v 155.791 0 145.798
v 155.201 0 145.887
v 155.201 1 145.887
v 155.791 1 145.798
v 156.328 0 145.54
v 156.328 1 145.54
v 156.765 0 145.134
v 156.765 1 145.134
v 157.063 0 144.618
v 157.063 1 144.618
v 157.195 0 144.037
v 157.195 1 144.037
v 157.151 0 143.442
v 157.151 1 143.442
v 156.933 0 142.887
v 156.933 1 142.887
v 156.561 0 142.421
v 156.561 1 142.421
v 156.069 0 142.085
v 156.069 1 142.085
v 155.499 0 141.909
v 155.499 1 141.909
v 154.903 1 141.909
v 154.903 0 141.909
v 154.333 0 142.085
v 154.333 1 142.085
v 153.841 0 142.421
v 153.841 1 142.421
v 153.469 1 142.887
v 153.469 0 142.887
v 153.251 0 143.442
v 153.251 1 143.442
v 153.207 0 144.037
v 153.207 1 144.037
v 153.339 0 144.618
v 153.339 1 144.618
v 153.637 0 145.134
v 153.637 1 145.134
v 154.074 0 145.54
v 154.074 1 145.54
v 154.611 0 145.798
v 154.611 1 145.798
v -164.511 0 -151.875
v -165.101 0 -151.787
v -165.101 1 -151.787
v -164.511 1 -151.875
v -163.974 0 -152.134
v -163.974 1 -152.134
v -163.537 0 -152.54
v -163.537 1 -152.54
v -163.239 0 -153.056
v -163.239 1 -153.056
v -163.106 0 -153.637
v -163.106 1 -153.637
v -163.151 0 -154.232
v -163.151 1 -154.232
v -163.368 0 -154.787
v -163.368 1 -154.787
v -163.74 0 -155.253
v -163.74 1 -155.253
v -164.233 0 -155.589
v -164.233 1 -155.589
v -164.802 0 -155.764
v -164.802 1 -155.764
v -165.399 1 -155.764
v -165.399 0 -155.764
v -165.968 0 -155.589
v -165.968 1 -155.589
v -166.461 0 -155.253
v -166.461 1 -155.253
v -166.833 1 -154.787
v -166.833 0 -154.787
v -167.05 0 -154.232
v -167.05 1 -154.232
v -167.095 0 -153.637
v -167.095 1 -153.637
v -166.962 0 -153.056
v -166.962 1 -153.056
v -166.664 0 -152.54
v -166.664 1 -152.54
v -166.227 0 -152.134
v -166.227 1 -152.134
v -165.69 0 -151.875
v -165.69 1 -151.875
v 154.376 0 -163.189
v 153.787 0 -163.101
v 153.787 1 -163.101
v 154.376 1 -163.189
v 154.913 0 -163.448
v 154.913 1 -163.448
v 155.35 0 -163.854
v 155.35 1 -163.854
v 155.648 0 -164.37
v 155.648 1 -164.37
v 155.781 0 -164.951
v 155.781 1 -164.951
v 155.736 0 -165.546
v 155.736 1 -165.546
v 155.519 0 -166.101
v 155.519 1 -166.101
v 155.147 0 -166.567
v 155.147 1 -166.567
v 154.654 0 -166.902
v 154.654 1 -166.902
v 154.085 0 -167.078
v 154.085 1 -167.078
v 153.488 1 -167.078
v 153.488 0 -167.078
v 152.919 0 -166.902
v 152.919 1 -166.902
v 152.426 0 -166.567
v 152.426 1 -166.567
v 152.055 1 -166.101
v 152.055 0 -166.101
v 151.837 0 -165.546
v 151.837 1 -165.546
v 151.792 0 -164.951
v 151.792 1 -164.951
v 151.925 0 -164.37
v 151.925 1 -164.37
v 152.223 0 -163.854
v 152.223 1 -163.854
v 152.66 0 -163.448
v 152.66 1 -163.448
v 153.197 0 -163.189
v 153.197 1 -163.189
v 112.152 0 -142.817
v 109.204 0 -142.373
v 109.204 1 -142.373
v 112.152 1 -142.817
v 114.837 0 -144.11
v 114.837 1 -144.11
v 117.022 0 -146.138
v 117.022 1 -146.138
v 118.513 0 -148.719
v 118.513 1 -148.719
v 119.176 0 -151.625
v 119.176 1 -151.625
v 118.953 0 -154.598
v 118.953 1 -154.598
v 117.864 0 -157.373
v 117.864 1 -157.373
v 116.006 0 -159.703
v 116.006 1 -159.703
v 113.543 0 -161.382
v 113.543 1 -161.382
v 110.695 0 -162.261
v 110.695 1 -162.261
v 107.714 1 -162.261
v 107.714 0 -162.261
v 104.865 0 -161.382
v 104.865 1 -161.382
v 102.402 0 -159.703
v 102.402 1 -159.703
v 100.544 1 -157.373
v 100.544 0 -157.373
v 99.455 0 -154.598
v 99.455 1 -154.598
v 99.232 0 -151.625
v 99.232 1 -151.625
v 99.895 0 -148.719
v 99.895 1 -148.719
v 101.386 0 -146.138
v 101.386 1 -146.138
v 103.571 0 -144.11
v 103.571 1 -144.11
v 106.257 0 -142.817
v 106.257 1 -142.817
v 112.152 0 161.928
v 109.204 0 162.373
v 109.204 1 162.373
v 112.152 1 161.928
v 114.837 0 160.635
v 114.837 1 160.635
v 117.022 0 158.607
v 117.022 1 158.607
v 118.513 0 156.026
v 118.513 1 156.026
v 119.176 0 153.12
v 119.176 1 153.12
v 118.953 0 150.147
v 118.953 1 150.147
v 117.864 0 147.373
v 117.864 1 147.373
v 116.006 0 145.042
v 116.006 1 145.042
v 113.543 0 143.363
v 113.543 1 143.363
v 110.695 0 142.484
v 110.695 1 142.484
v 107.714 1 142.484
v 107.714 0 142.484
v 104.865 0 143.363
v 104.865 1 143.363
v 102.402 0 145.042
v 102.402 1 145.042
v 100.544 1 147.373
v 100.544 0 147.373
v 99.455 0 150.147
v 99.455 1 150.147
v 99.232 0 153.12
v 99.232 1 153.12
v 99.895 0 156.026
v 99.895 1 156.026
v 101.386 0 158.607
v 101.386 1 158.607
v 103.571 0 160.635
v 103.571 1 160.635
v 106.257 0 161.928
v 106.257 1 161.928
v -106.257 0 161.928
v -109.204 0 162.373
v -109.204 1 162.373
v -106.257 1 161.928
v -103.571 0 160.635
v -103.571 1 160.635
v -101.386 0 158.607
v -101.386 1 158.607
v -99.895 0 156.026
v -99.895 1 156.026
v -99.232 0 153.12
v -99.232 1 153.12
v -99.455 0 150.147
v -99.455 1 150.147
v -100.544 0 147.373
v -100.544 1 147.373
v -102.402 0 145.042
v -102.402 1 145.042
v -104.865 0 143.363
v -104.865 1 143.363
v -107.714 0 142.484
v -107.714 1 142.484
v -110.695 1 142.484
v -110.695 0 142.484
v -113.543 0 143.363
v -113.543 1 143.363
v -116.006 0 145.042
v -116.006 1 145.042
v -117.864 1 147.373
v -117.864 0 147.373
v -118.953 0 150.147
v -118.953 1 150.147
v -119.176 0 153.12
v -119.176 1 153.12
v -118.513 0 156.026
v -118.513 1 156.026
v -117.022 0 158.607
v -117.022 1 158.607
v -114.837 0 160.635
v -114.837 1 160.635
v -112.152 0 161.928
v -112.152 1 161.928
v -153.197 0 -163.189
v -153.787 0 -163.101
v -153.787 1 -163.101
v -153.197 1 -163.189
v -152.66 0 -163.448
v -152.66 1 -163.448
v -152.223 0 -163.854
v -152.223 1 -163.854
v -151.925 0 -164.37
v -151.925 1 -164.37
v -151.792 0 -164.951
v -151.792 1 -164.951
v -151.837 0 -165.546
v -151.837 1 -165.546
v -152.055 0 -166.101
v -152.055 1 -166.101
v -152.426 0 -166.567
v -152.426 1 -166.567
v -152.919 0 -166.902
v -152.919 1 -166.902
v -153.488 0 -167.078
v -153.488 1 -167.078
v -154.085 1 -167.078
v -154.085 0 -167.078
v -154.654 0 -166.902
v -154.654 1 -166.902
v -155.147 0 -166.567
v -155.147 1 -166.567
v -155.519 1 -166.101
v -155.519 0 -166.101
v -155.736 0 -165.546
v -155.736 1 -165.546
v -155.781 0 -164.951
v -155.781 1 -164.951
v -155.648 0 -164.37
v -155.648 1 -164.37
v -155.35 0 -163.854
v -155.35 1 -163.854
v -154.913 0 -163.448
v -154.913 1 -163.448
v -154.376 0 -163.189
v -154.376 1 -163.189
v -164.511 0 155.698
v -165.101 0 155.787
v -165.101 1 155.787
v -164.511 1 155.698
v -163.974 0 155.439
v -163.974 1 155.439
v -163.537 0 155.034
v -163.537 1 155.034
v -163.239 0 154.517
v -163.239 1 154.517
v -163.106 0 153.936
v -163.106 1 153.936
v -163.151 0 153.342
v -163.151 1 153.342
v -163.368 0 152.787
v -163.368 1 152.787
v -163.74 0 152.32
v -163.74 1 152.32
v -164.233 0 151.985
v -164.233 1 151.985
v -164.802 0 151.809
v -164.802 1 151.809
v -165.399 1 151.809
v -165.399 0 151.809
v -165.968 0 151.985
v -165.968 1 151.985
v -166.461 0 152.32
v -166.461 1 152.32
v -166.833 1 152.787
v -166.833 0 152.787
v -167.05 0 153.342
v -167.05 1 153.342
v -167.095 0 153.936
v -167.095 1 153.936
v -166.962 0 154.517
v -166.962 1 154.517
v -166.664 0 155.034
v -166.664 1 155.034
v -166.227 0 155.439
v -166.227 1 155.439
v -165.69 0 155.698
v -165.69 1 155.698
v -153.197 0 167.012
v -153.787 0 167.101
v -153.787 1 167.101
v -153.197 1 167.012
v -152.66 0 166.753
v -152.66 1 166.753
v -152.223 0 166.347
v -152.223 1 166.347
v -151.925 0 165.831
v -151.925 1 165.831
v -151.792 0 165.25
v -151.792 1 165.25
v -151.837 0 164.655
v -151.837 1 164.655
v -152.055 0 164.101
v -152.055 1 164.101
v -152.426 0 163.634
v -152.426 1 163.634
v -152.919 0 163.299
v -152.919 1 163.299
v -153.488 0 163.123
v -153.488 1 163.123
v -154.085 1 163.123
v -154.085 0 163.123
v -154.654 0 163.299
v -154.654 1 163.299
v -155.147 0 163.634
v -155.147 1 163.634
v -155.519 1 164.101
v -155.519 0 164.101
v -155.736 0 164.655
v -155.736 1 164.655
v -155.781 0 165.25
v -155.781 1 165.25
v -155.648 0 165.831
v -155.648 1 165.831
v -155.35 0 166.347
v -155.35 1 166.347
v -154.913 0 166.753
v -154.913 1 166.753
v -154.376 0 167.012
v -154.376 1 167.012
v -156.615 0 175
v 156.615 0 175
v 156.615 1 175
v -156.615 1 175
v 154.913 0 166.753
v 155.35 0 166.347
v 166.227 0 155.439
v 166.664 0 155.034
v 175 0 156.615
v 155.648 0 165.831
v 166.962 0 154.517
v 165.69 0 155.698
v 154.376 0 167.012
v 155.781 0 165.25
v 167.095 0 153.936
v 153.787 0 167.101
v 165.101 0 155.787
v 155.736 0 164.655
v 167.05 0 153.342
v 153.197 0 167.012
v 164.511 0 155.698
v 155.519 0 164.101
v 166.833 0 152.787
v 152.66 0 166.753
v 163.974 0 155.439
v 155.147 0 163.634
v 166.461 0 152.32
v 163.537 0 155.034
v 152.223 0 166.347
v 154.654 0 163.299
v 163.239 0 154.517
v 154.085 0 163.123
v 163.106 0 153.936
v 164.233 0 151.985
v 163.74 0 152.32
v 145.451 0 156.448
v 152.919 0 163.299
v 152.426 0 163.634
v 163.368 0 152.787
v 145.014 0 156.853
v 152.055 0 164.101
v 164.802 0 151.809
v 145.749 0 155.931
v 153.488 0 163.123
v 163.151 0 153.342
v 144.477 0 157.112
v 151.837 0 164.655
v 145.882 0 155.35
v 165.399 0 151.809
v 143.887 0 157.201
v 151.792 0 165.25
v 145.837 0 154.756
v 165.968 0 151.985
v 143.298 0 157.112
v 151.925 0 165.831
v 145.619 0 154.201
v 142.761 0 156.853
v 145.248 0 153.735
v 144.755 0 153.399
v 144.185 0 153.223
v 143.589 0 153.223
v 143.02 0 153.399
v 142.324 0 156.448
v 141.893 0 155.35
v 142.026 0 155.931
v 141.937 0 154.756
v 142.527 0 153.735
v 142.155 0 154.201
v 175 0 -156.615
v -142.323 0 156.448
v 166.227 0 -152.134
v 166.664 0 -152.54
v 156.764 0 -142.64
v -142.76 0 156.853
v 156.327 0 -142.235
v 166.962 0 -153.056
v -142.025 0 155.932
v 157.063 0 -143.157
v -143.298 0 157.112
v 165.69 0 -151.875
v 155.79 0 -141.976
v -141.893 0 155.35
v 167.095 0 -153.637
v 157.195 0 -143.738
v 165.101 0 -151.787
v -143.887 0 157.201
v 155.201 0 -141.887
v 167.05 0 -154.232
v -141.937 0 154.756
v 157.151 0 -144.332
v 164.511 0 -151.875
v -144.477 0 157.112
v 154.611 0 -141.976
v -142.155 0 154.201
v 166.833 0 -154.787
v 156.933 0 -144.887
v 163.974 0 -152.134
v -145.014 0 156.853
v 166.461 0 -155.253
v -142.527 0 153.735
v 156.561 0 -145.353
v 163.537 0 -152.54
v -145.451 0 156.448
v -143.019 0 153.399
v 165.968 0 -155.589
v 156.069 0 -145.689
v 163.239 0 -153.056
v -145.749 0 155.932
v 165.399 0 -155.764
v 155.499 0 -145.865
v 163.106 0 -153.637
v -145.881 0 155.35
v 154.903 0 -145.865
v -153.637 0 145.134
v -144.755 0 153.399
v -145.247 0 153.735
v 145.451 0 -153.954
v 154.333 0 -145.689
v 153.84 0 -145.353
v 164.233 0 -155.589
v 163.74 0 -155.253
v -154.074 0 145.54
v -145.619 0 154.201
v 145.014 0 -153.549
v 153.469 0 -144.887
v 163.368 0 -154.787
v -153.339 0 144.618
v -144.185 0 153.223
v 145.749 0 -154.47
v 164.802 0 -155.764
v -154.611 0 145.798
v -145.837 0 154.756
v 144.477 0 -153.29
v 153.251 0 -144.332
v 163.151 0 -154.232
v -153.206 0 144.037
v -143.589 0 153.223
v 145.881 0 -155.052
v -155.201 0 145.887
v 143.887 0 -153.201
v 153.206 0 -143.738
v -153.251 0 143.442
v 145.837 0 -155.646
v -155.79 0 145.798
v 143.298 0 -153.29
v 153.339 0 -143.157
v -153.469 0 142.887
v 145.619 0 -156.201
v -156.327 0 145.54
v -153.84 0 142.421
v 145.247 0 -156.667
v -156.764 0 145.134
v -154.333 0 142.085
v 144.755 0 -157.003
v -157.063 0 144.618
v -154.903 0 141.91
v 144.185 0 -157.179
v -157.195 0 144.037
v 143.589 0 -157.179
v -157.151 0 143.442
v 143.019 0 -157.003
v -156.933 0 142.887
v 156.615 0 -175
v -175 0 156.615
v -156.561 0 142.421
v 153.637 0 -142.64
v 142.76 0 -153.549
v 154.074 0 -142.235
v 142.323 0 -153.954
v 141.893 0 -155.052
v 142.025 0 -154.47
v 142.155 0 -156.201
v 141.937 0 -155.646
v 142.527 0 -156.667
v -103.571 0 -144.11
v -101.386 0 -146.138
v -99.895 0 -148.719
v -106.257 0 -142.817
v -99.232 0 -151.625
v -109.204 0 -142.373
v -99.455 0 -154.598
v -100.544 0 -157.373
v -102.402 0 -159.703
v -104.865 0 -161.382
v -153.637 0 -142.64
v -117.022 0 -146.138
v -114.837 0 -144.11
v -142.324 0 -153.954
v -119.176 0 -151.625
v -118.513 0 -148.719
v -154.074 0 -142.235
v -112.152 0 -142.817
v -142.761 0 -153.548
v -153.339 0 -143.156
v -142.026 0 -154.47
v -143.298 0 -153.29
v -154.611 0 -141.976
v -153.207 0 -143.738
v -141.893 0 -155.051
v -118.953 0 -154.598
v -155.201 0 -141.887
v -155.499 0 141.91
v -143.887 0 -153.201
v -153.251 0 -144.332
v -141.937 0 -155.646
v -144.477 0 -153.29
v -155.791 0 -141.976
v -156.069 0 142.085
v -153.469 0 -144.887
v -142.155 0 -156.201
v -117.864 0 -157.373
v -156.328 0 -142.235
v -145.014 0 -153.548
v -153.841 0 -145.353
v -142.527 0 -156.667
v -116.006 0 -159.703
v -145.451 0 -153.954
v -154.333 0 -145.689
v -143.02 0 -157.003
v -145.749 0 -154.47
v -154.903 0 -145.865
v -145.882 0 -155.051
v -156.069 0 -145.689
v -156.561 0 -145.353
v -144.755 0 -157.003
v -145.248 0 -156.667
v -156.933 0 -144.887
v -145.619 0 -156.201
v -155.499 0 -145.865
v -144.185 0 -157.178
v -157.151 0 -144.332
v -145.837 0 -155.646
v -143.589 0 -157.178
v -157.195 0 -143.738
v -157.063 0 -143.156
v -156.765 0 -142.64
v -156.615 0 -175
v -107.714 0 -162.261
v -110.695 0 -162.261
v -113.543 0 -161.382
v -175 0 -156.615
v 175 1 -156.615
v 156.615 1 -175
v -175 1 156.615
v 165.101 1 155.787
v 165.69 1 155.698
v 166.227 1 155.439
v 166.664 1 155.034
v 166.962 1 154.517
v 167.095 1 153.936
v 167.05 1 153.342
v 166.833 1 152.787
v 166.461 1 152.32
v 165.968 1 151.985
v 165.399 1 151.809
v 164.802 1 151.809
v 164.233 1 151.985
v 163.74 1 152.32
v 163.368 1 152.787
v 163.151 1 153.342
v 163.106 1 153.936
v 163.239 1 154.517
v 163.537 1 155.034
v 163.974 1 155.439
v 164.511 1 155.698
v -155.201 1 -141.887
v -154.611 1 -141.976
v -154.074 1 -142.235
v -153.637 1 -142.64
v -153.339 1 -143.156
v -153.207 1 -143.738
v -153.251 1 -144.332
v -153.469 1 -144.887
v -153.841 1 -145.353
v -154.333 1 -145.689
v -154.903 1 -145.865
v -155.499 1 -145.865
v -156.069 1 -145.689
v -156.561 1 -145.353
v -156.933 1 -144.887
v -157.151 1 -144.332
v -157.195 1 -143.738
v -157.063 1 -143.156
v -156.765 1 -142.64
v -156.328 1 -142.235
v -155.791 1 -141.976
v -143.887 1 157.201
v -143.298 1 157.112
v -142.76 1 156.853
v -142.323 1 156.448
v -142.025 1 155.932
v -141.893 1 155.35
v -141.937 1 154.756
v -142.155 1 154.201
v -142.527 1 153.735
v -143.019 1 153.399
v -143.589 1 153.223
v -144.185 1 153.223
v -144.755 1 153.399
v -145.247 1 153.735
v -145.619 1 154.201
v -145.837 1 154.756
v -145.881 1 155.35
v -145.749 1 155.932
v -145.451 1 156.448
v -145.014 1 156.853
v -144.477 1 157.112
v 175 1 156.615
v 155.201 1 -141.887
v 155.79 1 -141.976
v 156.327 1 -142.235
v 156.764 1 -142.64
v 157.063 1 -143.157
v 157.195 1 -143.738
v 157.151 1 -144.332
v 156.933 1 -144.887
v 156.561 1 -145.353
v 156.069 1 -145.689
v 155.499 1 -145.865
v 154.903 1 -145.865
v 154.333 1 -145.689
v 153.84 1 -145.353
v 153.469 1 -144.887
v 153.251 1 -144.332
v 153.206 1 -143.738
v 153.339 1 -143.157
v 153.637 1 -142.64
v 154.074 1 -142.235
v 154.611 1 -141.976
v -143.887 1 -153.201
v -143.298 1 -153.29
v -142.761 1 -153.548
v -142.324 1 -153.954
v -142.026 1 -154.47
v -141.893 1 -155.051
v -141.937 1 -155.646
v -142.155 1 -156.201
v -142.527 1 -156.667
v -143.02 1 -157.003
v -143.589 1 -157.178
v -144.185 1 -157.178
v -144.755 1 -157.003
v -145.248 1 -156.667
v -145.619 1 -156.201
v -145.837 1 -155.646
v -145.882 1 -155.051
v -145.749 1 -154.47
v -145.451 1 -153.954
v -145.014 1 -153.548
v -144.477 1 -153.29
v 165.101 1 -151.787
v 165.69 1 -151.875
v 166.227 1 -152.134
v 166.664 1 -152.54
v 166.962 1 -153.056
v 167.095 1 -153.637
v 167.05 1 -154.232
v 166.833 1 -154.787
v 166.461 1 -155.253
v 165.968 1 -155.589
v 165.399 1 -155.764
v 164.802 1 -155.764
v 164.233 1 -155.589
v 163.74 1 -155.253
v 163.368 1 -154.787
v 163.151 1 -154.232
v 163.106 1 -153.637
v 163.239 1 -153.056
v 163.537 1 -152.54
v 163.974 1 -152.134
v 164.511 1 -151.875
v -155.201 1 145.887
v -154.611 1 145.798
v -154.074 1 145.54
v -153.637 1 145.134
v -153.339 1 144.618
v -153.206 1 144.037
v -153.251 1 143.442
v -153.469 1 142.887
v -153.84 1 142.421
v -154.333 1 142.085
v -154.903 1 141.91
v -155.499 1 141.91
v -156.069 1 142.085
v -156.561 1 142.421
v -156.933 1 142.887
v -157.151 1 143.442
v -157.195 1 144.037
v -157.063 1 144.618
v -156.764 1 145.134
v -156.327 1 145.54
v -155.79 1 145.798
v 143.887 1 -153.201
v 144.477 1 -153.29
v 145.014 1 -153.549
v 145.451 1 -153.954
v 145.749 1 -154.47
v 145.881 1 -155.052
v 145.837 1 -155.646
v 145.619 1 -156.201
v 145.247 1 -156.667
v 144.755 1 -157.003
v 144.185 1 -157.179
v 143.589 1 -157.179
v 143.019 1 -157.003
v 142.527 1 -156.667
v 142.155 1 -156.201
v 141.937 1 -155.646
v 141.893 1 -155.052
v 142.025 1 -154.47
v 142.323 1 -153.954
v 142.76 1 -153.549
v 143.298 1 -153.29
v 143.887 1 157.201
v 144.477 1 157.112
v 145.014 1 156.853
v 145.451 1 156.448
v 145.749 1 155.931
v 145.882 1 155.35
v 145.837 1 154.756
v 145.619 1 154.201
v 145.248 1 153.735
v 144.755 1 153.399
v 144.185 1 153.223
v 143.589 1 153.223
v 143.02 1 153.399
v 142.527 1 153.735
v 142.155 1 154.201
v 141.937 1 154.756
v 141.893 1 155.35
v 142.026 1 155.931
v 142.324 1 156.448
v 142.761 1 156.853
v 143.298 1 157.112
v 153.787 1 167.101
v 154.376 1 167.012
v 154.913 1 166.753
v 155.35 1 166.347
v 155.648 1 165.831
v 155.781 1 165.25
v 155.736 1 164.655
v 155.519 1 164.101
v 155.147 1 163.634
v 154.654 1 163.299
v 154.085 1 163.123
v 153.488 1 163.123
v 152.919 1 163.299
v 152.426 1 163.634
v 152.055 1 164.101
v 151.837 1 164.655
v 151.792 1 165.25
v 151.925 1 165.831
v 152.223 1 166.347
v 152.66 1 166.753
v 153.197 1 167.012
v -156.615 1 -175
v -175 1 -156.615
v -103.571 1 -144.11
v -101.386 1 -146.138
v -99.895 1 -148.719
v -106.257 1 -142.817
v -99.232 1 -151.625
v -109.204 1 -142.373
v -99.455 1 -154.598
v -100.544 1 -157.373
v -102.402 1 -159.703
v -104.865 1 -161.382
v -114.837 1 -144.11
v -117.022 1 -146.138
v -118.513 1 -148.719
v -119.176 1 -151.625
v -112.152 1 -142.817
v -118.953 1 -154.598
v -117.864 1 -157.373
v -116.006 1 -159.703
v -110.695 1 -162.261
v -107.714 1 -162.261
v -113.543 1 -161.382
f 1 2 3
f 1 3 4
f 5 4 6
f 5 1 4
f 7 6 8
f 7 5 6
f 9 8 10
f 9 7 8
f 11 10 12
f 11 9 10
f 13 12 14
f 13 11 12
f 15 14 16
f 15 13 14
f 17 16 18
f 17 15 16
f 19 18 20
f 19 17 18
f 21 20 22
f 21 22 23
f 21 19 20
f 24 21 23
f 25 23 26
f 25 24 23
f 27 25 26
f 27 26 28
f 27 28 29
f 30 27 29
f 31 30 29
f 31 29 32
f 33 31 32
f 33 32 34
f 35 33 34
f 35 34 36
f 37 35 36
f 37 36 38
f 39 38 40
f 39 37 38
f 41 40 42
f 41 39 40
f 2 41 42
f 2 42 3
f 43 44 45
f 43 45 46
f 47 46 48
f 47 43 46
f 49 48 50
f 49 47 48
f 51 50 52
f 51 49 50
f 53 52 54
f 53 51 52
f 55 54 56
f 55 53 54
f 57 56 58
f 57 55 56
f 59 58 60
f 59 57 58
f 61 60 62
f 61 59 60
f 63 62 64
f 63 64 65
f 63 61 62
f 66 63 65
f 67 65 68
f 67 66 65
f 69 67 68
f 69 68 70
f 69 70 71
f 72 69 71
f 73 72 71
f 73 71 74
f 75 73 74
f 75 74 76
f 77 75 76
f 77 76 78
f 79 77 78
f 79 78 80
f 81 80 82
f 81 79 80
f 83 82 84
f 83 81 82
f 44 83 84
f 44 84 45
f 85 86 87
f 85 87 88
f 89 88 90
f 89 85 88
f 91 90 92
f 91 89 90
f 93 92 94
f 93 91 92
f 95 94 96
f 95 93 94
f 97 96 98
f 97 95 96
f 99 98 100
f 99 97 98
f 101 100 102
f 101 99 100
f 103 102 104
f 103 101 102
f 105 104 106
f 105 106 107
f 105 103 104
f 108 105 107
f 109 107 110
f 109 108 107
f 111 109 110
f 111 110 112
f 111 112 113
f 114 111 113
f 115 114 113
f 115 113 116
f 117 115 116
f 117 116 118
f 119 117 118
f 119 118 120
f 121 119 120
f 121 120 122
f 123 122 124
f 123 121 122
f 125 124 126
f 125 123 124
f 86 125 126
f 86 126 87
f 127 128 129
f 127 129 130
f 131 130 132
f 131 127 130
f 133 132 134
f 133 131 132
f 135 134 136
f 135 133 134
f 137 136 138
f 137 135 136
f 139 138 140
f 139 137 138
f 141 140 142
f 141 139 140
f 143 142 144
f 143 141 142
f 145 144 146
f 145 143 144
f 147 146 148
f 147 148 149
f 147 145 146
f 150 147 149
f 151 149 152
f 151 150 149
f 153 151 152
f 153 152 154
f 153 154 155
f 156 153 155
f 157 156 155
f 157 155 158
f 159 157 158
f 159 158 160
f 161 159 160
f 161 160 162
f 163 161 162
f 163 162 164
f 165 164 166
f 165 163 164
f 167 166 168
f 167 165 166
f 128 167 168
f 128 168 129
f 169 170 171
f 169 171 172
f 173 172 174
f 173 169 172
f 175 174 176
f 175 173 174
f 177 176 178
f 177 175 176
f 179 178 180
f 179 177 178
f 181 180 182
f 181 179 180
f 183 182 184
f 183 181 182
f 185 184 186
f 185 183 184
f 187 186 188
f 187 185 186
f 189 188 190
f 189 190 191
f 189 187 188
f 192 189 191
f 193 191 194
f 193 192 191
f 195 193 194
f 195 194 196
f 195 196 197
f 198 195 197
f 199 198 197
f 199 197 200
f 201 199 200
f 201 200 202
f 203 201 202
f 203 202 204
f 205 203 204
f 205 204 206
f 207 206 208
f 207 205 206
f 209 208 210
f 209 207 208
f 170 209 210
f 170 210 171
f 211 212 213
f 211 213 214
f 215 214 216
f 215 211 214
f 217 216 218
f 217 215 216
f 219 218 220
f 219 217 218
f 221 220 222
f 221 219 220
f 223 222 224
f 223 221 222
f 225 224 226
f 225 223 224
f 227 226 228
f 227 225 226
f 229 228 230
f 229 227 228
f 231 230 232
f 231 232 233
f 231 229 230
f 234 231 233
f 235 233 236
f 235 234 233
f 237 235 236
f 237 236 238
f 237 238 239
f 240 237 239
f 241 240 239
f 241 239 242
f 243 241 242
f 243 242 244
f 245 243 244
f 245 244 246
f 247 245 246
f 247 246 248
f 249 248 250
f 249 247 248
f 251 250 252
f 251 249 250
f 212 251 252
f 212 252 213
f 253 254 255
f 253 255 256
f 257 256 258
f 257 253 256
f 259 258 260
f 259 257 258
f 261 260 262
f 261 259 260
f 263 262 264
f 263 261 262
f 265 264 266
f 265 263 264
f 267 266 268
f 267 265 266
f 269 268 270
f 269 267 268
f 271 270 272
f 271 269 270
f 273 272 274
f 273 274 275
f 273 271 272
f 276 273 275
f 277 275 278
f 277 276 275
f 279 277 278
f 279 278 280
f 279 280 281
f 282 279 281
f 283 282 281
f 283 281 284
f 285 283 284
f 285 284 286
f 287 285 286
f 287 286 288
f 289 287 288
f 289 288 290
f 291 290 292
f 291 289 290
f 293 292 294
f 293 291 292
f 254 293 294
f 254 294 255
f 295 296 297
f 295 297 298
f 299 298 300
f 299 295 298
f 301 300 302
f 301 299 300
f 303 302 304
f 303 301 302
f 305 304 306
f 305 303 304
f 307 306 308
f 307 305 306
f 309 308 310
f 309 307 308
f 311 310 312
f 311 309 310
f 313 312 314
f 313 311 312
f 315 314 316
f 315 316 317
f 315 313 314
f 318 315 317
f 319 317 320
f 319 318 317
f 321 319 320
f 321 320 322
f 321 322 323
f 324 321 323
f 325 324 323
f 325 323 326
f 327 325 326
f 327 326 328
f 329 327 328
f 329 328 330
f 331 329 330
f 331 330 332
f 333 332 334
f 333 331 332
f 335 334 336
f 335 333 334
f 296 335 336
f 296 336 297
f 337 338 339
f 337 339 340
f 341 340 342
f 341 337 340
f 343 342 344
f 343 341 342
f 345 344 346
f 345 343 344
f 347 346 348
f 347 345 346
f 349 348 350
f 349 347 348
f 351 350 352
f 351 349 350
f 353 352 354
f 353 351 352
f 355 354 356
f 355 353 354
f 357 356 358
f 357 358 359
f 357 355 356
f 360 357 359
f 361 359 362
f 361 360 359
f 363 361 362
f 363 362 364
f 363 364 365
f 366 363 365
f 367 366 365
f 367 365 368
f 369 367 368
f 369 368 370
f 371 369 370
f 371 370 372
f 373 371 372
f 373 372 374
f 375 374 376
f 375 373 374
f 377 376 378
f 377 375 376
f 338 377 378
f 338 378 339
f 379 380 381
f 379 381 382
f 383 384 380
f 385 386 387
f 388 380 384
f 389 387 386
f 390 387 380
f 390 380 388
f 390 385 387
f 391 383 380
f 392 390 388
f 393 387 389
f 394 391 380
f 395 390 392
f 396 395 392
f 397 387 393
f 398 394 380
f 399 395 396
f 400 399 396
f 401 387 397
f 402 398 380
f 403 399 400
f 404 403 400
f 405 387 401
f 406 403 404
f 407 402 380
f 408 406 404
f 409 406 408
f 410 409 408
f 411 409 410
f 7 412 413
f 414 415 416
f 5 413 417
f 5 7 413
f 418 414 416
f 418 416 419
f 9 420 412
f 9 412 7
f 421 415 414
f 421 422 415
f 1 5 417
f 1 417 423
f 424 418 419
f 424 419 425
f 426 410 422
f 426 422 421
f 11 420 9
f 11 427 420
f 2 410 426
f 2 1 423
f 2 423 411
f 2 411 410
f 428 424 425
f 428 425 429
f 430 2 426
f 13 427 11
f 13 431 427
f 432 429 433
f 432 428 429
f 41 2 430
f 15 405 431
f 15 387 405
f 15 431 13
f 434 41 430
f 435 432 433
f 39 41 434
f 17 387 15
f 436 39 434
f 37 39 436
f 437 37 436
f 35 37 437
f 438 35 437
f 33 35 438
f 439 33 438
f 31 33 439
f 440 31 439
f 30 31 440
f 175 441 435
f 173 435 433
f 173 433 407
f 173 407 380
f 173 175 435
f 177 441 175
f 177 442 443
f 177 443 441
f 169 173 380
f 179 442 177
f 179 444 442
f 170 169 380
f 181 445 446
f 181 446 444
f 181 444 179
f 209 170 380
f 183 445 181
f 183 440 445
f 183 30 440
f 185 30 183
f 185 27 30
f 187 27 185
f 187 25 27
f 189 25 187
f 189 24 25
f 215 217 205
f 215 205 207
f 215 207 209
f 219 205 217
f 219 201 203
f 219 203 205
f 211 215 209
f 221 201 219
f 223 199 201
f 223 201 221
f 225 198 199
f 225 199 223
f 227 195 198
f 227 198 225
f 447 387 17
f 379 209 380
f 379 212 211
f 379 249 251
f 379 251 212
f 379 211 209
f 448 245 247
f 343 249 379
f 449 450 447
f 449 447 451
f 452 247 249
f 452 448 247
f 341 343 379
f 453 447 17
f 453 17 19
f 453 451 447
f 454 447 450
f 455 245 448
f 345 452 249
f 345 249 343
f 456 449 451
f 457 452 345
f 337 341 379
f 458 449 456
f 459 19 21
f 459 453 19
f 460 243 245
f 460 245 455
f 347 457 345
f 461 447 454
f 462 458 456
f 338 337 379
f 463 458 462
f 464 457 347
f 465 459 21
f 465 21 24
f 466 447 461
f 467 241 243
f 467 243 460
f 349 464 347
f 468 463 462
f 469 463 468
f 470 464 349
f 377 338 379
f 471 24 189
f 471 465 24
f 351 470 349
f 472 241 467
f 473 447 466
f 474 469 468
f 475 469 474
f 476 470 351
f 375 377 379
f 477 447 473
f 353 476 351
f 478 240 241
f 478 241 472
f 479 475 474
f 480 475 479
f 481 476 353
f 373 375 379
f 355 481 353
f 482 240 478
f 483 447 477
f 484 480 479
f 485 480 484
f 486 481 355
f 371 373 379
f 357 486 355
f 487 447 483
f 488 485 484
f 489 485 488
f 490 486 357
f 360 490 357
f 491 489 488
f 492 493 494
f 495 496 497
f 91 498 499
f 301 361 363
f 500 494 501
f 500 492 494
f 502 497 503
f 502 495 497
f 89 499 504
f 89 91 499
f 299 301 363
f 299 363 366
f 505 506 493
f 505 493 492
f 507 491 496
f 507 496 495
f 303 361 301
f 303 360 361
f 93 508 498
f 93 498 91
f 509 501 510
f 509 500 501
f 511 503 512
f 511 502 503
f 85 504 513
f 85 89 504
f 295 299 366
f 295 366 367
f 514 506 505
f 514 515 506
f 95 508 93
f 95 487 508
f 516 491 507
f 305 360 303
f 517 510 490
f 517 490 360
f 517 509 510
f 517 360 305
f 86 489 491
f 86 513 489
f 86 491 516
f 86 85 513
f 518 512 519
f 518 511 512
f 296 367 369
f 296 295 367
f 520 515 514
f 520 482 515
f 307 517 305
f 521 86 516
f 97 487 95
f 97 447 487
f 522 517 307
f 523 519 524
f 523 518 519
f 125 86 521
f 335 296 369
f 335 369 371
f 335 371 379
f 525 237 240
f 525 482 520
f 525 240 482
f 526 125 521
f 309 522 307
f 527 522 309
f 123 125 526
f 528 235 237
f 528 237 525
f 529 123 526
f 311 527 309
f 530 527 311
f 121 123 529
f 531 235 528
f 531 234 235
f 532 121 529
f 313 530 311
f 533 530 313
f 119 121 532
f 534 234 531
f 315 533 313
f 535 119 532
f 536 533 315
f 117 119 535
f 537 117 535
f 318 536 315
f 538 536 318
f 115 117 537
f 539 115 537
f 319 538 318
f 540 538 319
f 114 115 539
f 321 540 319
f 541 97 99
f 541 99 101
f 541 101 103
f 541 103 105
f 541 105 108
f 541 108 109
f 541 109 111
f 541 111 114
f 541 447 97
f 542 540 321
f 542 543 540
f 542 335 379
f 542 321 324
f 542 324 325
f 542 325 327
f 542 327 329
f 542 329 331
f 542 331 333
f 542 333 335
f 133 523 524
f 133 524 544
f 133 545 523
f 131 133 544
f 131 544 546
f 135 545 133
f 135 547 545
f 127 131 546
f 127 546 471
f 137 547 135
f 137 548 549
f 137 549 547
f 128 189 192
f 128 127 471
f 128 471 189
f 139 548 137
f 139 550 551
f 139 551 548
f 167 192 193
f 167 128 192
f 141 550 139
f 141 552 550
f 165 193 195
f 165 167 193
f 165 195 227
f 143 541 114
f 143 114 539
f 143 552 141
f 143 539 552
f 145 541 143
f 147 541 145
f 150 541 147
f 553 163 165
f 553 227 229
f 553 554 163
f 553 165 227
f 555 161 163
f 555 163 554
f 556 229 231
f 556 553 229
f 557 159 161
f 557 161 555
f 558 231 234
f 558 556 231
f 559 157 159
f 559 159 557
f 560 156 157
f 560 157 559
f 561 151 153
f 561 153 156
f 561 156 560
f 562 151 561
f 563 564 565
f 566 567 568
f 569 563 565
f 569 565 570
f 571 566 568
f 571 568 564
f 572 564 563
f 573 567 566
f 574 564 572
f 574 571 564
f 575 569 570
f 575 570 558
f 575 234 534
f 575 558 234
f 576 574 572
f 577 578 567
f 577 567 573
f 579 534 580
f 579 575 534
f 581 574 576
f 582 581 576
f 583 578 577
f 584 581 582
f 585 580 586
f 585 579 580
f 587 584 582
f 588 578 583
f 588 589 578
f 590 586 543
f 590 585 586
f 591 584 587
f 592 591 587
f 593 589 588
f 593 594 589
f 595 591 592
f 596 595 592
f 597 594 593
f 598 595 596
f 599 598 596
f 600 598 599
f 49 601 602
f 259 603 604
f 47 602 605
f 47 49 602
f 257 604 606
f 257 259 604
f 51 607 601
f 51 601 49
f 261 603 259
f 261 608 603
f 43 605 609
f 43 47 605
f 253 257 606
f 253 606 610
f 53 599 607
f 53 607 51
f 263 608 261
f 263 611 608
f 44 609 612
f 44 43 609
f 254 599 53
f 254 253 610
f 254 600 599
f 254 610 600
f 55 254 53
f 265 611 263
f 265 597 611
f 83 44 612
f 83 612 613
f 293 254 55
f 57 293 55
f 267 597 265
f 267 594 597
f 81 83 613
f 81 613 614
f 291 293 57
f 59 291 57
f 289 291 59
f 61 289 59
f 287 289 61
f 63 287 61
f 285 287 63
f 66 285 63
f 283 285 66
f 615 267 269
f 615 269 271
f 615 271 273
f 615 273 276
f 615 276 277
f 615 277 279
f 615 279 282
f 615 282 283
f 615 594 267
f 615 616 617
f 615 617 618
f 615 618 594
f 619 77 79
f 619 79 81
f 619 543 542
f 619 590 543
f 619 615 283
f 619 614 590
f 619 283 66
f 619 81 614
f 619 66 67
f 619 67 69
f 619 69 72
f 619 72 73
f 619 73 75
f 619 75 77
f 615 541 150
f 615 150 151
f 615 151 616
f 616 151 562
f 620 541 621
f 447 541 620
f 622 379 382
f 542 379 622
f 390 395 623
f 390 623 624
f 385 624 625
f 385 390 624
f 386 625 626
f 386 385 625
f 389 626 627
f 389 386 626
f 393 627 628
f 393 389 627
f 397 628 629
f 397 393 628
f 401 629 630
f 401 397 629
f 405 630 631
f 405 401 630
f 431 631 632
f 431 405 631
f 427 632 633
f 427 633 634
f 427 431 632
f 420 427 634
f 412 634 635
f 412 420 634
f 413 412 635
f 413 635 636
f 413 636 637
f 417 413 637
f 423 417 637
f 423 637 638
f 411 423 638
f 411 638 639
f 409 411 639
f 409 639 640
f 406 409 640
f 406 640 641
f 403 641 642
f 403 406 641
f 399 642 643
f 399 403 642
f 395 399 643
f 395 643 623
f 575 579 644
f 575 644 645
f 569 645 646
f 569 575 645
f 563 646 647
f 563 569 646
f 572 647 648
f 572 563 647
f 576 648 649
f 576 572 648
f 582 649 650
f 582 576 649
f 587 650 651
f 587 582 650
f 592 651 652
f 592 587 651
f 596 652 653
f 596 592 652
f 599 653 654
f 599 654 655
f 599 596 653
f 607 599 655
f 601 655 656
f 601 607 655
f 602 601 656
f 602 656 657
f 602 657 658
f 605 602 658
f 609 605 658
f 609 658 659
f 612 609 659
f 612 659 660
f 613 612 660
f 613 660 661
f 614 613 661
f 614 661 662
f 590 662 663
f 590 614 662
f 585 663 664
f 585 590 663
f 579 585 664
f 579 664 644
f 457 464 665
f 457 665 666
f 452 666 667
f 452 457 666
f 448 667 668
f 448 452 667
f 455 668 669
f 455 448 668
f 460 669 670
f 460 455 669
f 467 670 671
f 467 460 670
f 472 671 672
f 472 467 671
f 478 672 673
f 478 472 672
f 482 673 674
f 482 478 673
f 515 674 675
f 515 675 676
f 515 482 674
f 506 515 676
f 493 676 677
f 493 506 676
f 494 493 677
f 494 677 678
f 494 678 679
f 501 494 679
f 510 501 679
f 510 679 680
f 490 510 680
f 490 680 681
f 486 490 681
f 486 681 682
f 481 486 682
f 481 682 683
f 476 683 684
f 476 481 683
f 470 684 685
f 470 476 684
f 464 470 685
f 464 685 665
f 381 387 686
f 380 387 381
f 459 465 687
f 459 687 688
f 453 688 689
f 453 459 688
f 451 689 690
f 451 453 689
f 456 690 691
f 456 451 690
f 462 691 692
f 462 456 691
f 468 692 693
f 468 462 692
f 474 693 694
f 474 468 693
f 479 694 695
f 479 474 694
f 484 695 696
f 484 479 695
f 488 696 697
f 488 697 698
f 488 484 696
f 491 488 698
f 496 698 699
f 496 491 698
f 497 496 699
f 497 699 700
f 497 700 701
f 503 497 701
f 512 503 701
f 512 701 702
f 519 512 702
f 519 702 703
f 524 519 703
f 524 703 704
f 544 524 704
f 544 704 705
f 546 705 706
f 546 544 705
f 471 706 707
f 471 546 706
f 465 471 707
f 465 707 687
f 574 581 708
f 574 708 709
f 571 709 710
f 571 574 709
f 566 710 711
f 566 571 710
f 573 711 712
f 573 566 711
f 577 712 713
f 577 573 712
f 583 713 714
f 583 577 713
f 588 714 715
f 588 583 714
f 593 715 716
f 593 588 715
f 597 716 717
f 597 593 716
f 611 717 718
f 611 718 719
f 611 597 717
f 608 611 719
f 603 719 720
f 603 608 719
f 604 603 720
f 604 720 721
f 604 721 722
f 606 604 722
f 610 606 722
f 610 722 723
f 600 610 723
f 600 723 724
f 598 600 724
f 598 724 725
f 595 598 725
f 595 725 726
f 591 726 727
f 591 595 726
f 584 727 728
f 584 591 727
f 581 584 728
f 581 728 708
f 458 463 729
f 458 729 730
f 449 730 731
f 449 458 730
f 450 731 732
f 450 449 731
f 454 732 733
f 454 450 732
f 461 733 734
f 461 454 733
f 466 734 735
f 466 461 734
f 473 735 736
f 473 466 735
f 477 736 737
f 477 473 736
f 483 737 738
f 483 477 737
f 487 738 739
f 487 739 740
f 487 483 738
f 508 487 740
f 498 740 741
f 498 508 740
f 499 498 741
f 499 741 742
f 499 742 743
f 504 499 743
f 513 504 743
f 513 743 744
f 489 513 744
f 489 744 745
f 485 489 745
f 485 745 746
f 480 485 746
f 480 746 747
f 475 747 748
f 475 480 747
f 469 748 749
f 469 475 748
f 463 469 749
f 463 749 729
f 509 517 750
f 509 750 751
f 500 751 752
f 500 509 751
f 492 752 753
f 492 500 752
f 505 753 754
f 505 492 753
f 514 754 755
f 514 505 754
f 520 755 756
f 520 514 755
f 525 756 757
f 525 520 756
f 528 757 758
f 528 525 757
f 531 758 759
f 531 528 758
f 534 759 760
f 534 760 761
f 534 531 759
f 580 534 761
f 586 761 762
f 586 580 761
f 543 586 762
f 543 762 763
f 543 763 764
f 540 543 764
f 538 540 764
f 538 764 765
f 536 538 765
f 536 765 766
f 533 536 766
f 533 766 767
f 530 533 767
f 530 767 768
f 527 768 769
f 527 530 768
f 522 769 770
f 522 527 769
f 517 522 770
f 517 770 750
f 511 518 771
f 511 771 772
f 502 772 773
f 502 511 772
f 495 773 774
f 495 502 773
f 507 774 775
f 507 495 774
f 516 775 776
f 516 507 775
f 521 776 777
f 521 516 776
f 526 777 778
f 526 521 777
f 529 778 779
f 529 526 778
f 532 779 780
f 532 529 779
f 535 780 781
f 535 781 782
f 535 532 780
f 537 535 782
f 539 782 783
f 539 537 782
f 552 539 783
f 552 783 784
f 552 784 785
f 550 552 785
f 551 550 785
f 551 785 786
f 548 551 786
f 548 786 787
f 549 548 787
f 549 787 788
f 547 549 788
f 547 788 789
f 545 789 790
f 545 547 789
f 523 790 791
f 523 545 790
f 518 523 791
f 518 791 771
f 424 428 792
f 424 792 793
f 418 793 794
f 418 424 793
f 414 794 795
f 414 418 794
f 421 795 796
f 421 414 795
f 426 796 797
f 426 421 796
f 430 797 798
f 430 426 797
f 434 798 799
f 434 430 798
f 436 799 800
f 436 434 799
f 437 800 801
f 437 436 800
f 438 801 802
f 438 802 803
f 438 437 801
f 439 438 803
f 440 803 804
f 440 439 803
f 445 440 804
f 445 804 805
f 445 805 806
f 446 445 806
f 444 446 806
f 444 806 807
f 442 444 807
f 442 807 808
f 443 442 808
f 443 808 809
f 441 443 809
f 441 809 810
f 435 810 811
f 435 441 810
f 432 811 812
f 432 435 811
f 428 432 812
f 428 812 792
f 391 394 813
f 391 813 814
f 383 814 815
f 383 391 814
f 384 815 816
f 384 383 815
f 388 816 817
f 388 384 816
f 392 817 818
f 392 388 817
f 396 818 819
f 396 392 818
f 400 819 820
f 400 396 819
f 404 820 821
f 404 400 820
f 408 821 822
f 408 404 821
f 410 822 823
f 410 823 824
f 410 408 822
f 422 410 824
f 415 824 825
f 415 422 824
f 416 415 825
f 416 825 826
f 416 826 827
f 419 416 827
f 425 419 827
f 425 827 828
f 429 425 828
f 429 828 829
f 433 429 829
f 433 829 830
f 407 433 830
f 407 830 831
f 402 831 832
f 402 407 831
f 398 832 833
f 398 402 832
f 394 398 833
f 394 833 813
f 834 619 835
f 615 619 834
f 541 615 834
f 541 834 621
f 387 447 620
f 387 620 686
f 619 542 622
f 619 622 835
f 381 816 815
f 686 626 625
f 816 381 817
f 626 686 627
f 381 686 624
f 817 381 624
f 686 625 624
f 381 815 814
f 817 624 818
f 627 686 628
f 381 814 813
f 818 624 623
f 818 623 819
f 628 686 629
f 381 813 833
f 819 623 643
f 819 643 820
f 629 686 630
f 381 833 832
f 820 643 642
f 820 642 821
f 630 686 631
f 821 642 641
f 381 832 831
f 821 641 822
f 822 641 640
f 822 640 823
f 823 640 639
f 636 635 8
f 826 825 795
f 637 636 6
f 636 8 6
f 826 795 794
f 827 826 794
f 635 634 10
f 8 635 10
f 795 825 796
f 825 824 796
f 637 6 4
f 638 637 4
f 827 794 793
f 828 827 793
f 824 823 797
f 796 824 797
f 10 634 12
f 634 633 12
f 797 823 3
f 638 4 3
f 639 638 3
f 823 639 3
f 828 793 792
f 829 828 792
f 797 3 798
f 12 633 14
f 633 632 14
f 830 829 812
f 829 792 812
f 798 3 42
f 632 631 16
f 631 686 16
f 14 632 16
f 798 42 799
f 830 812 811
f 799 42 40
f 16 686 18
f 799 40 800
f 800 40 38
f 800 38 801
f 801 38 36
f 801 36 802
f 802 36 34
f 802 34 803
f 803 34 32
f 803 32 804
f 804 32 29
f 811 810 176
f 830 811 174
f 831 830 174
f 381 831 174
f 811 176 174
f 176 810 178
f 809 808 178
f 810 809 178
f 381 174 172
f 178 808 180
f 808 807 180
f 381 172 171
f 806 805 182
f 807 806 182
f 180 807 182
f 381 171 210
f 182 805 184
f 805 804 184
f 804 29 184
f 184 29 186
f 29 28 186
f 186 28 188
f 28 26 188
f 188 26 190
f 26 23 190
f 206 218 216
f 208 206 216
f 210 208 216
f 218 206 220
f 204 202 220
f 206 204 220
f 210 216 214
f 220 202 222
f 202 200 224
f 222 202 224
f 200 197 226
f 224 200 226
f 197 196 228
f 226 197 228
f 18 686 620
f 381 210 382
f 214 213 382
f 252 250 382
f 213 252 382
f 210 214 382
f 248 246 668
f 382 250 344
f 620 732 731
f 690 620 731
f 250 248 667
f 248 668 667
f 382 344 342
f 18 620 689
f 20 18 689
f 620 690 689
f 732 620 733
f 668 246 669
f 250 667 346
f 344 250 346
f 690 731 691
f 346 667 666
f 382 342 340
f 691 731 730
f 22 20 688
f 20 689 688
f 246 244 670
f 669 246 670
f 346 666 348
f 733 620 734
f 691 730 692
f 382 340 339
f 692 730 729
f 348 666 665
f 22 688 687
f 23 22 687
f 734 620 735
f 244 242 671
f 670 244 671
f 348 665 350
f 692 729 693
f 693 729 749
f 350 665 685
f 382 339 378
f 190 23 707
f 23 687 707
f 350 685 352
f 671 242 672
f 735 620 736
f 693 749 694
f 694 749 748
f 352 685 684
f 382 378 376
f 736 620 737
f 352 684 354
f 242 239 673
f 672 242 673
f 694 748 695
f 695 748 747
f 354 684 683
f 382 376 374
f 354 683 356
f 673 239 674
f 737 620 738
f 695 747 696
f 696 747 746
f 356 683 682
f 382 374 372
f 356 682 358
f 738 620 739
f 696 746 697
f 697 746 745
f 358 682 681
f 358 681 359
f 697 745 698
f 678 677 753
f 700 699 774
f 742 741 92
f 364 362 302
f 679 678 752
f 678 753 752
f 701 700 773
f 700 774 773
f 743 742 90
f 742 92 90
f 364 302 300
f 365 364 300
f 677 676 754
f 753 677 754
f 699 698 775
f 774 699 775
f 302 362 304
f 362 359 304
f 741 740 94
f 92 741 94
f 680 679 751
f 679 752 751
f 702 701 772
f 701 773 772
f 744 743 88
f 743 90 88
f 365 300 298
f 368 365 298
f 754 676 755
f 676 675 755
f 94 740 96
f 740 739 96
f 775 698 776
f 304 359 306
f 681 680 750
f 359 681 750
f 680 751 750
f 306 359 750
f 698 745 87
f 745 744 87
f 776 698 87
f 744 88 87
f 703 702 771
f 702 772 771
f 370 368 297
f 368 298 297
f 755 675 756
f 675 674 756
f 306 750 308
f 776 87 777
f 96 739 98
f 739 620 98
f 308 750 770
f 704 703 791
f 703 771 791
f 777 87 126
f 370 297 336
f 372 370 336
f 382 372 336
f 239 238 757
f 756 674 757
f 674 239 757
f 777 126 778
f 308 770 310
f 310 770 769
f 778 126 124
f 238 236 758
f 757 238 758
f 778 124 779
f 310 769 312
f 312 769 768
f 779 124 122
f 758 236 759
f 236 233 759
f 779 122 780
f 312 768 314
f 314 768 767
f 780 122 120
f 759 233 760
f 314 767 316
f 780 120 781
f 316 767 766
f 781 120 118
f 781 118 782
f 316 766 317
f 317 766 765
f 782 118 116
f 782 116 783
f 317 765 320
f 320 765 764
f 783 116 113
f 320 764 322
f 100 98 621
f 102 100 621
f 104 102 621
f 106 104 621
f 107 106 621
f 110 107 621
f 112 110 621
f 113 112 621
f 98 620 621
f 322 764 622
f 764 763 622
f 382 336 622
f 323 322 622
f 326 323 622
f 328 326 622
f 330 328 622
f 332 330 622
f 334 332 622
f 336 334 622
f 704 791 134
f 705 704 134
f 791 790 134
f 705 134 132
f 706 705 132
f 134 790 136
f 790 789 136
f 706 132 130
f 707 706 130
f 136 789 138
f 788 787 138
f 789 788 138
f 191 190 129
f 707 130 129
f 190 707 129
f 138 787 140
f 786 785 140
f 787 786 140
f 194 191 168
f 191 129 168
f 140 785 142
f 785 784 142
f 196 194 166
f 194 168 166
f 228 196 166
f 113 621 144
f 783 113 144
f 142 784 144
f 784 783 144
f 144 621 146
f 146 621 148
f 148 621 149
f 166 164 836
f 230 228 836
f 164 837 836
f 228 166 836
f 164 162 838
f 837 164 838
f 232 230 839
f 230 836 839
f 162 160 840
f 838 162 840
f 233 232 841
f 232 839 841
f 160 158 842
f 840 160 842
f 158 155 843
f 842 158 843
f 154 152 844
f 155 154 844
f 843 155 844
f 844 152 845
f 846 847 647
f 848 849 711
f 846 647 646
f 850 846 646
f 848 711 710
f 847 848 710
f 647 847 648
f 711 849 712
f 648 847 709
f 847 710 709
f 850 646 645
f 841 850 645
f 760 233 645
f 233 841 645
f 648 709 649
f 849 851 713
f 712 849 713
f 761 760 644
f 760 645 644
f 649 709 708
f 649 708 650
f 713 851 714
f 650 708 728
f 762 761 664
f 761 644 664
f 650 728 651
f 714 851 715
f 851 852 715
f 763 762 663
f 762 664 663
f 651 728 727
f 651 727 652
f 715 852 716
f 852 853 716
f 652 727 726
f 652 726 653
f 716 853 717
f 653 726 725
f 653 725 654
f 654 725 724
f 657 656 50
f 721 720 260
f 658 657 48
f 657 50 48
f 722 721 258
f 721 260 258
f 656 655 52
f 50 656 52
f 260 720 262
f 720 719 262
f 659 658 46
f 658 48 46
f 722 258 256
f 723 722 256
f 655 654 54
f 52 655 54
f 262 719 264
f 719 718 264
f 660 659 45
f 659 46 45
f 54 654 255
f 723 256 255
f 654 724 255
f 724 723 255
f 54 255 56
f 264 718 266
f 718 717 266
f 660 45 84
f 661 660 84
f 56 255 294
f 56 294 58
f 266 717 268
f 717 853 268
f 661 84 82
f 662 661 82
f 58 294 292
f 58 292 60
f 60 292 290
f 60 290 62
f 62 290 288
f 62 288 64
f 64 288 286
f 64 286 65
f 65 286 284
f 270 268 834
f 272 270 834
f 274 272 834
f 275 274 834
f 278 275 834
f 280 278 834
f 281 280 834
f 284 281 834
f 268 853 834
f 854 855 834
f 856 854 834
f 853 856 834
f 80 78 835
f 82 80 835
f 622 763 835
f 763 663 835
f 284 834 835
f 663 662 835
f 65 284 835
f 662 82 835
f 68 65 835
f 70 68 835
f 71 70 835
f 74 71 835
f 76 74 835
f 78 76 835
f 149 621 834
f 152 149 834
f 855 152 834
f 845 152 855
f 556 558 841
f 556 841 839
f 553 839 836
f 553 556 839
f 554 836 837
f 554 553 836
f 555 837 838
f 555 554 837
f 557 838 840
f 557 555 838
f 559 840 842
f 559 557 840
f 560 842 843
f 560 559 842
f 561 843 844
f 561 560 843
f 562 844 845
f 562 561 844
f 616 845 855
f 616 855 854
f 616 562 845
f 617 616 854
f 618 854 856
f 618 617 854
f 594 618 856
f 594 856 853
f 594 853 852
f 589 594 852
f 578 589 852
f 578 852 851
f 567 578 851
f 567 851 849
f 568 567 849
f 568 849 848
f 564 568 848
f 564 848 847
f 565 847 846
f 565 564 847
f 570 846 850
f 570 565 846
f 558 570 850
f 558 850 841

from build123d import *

# Parameters (mm, degrees)
SKETCH2_R           = 2
SKETCH2_R_2         = 10
BOSS_EXTRUDE3_DEPTH = 1


with BuildPart() as part:
    # Sketch2 → Boss-Extrude3 (new body)
    with BuildSketch(Plane(origin=(0, 0, 0), x_dir=(1, 0, 0), z_dir=(0, 1, 0))):
        Polygon((-156.615, 175), (156.615, 175), (175, 156.615), (175, -156.615), (156.615, -175), (-156.615, -175), (-175, -156.615), (-175, 156.615), align=None)
        with Locations(Location((-165.100505063, 153.786572875, 0), (0, 0, 270))):
            Circle(SKETCH2_R, mode=Mode.SUBTRACT)
        with Locations(Location((-153.786572875, 165.100505063, 0), (0, 0, 270))):
            Circle(SKETCH2_R, mode=Mode.SUBTRACT)
        with Locations(Location((-155.201010127, 143.887077939, 0), (0, 0, 270))):
            Circle(SKETCH2_R, mode=Mode.SUBTRACT)
        with Locations(Location((-143.887301628, 155.200786438, 0), (0, 0, 270))):
            Circle(SKETCH2_R, mode=Mode.SUBTRACT)
        with Locations(Location((153.786572875, 165.100505063, 0), (0, 0, 270))):
            Circle(SKETCH2_R, mode=Mode.SUBTRACT)
        with Locations(Location((165.100505063, 153.786572875, 0), (0, 0, 270))):
            Circle(SKETCH2_R, mode=Mode.SUBTRACT)
        with Locations(Location((143.887077939, 155.201010127, 0), (0, 0, 270))):
            Circle(SKETCH2_R, mode=Mode.SUBTRACT)
        with Locations(Location((155.200786438, 143.887301628, 0), (0, 0, 270))):
            Circle(SKETCH2_R, mode=Mode.SUBTRACT)
        with Locations(Location((165.100505063, -153.786572875, 0), (0, 0, 270))):
            Circle(SKETCH2_R, mode=Mode.SUBTRACT)
        with Locations(Location((153.786572875, -165.100505063, 0), (0, 0, 270))):
            Circle(SKETCH2_R, mode=Mode.SUBTRACT)
        with Locations(Location((155.201010127, -143.887077939, 0), (0, 0, 270))):
            Circle(SKETCH2_R, mode=Mode.SUBTRACT)
        with Locations(Location((143.887301628, -155.200786438, 0), (0, 0, 270))):
            Circle(SKETCH2_R, mode=Mode.SUBTRACT)
        with Locations(Location((-153.786572875, -165.100505063, 0), (0, 0, 270))):
            Circle(SKETCH2_R, mode=Mode.SUBTRACT)
        with Locations(Location((-165.100505063, -153.786572875, 0), (0, 0, 270))):
            Circle(SKETCH2_R, mode=Mode.SUBTRACT)
        with Locations(Location((-143.887077939, -155.201010127, 0), (0, 0, 270))):
            Circle(SKETCH2_R, mode=Mode.SUBTRACT)
        with Locations(Location((-155.200786438, -143.887301628, 0), (0, 0, 270))):
            Circle(SKETCH2_R, mode=Mode.SUBTRACT)
        with Locations(Location((-109.204108061, 152.372583002, 0), (0, 0, 270))):
            Circle(SKETCH2_R_2, mode=Mode.SUBTRACT)
        with Locations(Location((109.204108061, 152.372583002, 0), (0, 0, 270))):
            Circle(SKETCH2_R_2, mode=Mode.SUBTRACT)
        with Locations(Location((109.204108061, -152.372583002, 0), (0, 0, 270))):
            Circle(SKETCH2_R_2, mode=Mode.SUBTRACT)
        with Locations(Location((-109.204108061, -152.372583002, 0), (0, 0, 270))):
            Circle(SKETCH2_R_2, mode=Mode.SUBTRACT)
    extrude(amount=BOSS_EXTRUDE3_DEPTH)


solid = part.part
